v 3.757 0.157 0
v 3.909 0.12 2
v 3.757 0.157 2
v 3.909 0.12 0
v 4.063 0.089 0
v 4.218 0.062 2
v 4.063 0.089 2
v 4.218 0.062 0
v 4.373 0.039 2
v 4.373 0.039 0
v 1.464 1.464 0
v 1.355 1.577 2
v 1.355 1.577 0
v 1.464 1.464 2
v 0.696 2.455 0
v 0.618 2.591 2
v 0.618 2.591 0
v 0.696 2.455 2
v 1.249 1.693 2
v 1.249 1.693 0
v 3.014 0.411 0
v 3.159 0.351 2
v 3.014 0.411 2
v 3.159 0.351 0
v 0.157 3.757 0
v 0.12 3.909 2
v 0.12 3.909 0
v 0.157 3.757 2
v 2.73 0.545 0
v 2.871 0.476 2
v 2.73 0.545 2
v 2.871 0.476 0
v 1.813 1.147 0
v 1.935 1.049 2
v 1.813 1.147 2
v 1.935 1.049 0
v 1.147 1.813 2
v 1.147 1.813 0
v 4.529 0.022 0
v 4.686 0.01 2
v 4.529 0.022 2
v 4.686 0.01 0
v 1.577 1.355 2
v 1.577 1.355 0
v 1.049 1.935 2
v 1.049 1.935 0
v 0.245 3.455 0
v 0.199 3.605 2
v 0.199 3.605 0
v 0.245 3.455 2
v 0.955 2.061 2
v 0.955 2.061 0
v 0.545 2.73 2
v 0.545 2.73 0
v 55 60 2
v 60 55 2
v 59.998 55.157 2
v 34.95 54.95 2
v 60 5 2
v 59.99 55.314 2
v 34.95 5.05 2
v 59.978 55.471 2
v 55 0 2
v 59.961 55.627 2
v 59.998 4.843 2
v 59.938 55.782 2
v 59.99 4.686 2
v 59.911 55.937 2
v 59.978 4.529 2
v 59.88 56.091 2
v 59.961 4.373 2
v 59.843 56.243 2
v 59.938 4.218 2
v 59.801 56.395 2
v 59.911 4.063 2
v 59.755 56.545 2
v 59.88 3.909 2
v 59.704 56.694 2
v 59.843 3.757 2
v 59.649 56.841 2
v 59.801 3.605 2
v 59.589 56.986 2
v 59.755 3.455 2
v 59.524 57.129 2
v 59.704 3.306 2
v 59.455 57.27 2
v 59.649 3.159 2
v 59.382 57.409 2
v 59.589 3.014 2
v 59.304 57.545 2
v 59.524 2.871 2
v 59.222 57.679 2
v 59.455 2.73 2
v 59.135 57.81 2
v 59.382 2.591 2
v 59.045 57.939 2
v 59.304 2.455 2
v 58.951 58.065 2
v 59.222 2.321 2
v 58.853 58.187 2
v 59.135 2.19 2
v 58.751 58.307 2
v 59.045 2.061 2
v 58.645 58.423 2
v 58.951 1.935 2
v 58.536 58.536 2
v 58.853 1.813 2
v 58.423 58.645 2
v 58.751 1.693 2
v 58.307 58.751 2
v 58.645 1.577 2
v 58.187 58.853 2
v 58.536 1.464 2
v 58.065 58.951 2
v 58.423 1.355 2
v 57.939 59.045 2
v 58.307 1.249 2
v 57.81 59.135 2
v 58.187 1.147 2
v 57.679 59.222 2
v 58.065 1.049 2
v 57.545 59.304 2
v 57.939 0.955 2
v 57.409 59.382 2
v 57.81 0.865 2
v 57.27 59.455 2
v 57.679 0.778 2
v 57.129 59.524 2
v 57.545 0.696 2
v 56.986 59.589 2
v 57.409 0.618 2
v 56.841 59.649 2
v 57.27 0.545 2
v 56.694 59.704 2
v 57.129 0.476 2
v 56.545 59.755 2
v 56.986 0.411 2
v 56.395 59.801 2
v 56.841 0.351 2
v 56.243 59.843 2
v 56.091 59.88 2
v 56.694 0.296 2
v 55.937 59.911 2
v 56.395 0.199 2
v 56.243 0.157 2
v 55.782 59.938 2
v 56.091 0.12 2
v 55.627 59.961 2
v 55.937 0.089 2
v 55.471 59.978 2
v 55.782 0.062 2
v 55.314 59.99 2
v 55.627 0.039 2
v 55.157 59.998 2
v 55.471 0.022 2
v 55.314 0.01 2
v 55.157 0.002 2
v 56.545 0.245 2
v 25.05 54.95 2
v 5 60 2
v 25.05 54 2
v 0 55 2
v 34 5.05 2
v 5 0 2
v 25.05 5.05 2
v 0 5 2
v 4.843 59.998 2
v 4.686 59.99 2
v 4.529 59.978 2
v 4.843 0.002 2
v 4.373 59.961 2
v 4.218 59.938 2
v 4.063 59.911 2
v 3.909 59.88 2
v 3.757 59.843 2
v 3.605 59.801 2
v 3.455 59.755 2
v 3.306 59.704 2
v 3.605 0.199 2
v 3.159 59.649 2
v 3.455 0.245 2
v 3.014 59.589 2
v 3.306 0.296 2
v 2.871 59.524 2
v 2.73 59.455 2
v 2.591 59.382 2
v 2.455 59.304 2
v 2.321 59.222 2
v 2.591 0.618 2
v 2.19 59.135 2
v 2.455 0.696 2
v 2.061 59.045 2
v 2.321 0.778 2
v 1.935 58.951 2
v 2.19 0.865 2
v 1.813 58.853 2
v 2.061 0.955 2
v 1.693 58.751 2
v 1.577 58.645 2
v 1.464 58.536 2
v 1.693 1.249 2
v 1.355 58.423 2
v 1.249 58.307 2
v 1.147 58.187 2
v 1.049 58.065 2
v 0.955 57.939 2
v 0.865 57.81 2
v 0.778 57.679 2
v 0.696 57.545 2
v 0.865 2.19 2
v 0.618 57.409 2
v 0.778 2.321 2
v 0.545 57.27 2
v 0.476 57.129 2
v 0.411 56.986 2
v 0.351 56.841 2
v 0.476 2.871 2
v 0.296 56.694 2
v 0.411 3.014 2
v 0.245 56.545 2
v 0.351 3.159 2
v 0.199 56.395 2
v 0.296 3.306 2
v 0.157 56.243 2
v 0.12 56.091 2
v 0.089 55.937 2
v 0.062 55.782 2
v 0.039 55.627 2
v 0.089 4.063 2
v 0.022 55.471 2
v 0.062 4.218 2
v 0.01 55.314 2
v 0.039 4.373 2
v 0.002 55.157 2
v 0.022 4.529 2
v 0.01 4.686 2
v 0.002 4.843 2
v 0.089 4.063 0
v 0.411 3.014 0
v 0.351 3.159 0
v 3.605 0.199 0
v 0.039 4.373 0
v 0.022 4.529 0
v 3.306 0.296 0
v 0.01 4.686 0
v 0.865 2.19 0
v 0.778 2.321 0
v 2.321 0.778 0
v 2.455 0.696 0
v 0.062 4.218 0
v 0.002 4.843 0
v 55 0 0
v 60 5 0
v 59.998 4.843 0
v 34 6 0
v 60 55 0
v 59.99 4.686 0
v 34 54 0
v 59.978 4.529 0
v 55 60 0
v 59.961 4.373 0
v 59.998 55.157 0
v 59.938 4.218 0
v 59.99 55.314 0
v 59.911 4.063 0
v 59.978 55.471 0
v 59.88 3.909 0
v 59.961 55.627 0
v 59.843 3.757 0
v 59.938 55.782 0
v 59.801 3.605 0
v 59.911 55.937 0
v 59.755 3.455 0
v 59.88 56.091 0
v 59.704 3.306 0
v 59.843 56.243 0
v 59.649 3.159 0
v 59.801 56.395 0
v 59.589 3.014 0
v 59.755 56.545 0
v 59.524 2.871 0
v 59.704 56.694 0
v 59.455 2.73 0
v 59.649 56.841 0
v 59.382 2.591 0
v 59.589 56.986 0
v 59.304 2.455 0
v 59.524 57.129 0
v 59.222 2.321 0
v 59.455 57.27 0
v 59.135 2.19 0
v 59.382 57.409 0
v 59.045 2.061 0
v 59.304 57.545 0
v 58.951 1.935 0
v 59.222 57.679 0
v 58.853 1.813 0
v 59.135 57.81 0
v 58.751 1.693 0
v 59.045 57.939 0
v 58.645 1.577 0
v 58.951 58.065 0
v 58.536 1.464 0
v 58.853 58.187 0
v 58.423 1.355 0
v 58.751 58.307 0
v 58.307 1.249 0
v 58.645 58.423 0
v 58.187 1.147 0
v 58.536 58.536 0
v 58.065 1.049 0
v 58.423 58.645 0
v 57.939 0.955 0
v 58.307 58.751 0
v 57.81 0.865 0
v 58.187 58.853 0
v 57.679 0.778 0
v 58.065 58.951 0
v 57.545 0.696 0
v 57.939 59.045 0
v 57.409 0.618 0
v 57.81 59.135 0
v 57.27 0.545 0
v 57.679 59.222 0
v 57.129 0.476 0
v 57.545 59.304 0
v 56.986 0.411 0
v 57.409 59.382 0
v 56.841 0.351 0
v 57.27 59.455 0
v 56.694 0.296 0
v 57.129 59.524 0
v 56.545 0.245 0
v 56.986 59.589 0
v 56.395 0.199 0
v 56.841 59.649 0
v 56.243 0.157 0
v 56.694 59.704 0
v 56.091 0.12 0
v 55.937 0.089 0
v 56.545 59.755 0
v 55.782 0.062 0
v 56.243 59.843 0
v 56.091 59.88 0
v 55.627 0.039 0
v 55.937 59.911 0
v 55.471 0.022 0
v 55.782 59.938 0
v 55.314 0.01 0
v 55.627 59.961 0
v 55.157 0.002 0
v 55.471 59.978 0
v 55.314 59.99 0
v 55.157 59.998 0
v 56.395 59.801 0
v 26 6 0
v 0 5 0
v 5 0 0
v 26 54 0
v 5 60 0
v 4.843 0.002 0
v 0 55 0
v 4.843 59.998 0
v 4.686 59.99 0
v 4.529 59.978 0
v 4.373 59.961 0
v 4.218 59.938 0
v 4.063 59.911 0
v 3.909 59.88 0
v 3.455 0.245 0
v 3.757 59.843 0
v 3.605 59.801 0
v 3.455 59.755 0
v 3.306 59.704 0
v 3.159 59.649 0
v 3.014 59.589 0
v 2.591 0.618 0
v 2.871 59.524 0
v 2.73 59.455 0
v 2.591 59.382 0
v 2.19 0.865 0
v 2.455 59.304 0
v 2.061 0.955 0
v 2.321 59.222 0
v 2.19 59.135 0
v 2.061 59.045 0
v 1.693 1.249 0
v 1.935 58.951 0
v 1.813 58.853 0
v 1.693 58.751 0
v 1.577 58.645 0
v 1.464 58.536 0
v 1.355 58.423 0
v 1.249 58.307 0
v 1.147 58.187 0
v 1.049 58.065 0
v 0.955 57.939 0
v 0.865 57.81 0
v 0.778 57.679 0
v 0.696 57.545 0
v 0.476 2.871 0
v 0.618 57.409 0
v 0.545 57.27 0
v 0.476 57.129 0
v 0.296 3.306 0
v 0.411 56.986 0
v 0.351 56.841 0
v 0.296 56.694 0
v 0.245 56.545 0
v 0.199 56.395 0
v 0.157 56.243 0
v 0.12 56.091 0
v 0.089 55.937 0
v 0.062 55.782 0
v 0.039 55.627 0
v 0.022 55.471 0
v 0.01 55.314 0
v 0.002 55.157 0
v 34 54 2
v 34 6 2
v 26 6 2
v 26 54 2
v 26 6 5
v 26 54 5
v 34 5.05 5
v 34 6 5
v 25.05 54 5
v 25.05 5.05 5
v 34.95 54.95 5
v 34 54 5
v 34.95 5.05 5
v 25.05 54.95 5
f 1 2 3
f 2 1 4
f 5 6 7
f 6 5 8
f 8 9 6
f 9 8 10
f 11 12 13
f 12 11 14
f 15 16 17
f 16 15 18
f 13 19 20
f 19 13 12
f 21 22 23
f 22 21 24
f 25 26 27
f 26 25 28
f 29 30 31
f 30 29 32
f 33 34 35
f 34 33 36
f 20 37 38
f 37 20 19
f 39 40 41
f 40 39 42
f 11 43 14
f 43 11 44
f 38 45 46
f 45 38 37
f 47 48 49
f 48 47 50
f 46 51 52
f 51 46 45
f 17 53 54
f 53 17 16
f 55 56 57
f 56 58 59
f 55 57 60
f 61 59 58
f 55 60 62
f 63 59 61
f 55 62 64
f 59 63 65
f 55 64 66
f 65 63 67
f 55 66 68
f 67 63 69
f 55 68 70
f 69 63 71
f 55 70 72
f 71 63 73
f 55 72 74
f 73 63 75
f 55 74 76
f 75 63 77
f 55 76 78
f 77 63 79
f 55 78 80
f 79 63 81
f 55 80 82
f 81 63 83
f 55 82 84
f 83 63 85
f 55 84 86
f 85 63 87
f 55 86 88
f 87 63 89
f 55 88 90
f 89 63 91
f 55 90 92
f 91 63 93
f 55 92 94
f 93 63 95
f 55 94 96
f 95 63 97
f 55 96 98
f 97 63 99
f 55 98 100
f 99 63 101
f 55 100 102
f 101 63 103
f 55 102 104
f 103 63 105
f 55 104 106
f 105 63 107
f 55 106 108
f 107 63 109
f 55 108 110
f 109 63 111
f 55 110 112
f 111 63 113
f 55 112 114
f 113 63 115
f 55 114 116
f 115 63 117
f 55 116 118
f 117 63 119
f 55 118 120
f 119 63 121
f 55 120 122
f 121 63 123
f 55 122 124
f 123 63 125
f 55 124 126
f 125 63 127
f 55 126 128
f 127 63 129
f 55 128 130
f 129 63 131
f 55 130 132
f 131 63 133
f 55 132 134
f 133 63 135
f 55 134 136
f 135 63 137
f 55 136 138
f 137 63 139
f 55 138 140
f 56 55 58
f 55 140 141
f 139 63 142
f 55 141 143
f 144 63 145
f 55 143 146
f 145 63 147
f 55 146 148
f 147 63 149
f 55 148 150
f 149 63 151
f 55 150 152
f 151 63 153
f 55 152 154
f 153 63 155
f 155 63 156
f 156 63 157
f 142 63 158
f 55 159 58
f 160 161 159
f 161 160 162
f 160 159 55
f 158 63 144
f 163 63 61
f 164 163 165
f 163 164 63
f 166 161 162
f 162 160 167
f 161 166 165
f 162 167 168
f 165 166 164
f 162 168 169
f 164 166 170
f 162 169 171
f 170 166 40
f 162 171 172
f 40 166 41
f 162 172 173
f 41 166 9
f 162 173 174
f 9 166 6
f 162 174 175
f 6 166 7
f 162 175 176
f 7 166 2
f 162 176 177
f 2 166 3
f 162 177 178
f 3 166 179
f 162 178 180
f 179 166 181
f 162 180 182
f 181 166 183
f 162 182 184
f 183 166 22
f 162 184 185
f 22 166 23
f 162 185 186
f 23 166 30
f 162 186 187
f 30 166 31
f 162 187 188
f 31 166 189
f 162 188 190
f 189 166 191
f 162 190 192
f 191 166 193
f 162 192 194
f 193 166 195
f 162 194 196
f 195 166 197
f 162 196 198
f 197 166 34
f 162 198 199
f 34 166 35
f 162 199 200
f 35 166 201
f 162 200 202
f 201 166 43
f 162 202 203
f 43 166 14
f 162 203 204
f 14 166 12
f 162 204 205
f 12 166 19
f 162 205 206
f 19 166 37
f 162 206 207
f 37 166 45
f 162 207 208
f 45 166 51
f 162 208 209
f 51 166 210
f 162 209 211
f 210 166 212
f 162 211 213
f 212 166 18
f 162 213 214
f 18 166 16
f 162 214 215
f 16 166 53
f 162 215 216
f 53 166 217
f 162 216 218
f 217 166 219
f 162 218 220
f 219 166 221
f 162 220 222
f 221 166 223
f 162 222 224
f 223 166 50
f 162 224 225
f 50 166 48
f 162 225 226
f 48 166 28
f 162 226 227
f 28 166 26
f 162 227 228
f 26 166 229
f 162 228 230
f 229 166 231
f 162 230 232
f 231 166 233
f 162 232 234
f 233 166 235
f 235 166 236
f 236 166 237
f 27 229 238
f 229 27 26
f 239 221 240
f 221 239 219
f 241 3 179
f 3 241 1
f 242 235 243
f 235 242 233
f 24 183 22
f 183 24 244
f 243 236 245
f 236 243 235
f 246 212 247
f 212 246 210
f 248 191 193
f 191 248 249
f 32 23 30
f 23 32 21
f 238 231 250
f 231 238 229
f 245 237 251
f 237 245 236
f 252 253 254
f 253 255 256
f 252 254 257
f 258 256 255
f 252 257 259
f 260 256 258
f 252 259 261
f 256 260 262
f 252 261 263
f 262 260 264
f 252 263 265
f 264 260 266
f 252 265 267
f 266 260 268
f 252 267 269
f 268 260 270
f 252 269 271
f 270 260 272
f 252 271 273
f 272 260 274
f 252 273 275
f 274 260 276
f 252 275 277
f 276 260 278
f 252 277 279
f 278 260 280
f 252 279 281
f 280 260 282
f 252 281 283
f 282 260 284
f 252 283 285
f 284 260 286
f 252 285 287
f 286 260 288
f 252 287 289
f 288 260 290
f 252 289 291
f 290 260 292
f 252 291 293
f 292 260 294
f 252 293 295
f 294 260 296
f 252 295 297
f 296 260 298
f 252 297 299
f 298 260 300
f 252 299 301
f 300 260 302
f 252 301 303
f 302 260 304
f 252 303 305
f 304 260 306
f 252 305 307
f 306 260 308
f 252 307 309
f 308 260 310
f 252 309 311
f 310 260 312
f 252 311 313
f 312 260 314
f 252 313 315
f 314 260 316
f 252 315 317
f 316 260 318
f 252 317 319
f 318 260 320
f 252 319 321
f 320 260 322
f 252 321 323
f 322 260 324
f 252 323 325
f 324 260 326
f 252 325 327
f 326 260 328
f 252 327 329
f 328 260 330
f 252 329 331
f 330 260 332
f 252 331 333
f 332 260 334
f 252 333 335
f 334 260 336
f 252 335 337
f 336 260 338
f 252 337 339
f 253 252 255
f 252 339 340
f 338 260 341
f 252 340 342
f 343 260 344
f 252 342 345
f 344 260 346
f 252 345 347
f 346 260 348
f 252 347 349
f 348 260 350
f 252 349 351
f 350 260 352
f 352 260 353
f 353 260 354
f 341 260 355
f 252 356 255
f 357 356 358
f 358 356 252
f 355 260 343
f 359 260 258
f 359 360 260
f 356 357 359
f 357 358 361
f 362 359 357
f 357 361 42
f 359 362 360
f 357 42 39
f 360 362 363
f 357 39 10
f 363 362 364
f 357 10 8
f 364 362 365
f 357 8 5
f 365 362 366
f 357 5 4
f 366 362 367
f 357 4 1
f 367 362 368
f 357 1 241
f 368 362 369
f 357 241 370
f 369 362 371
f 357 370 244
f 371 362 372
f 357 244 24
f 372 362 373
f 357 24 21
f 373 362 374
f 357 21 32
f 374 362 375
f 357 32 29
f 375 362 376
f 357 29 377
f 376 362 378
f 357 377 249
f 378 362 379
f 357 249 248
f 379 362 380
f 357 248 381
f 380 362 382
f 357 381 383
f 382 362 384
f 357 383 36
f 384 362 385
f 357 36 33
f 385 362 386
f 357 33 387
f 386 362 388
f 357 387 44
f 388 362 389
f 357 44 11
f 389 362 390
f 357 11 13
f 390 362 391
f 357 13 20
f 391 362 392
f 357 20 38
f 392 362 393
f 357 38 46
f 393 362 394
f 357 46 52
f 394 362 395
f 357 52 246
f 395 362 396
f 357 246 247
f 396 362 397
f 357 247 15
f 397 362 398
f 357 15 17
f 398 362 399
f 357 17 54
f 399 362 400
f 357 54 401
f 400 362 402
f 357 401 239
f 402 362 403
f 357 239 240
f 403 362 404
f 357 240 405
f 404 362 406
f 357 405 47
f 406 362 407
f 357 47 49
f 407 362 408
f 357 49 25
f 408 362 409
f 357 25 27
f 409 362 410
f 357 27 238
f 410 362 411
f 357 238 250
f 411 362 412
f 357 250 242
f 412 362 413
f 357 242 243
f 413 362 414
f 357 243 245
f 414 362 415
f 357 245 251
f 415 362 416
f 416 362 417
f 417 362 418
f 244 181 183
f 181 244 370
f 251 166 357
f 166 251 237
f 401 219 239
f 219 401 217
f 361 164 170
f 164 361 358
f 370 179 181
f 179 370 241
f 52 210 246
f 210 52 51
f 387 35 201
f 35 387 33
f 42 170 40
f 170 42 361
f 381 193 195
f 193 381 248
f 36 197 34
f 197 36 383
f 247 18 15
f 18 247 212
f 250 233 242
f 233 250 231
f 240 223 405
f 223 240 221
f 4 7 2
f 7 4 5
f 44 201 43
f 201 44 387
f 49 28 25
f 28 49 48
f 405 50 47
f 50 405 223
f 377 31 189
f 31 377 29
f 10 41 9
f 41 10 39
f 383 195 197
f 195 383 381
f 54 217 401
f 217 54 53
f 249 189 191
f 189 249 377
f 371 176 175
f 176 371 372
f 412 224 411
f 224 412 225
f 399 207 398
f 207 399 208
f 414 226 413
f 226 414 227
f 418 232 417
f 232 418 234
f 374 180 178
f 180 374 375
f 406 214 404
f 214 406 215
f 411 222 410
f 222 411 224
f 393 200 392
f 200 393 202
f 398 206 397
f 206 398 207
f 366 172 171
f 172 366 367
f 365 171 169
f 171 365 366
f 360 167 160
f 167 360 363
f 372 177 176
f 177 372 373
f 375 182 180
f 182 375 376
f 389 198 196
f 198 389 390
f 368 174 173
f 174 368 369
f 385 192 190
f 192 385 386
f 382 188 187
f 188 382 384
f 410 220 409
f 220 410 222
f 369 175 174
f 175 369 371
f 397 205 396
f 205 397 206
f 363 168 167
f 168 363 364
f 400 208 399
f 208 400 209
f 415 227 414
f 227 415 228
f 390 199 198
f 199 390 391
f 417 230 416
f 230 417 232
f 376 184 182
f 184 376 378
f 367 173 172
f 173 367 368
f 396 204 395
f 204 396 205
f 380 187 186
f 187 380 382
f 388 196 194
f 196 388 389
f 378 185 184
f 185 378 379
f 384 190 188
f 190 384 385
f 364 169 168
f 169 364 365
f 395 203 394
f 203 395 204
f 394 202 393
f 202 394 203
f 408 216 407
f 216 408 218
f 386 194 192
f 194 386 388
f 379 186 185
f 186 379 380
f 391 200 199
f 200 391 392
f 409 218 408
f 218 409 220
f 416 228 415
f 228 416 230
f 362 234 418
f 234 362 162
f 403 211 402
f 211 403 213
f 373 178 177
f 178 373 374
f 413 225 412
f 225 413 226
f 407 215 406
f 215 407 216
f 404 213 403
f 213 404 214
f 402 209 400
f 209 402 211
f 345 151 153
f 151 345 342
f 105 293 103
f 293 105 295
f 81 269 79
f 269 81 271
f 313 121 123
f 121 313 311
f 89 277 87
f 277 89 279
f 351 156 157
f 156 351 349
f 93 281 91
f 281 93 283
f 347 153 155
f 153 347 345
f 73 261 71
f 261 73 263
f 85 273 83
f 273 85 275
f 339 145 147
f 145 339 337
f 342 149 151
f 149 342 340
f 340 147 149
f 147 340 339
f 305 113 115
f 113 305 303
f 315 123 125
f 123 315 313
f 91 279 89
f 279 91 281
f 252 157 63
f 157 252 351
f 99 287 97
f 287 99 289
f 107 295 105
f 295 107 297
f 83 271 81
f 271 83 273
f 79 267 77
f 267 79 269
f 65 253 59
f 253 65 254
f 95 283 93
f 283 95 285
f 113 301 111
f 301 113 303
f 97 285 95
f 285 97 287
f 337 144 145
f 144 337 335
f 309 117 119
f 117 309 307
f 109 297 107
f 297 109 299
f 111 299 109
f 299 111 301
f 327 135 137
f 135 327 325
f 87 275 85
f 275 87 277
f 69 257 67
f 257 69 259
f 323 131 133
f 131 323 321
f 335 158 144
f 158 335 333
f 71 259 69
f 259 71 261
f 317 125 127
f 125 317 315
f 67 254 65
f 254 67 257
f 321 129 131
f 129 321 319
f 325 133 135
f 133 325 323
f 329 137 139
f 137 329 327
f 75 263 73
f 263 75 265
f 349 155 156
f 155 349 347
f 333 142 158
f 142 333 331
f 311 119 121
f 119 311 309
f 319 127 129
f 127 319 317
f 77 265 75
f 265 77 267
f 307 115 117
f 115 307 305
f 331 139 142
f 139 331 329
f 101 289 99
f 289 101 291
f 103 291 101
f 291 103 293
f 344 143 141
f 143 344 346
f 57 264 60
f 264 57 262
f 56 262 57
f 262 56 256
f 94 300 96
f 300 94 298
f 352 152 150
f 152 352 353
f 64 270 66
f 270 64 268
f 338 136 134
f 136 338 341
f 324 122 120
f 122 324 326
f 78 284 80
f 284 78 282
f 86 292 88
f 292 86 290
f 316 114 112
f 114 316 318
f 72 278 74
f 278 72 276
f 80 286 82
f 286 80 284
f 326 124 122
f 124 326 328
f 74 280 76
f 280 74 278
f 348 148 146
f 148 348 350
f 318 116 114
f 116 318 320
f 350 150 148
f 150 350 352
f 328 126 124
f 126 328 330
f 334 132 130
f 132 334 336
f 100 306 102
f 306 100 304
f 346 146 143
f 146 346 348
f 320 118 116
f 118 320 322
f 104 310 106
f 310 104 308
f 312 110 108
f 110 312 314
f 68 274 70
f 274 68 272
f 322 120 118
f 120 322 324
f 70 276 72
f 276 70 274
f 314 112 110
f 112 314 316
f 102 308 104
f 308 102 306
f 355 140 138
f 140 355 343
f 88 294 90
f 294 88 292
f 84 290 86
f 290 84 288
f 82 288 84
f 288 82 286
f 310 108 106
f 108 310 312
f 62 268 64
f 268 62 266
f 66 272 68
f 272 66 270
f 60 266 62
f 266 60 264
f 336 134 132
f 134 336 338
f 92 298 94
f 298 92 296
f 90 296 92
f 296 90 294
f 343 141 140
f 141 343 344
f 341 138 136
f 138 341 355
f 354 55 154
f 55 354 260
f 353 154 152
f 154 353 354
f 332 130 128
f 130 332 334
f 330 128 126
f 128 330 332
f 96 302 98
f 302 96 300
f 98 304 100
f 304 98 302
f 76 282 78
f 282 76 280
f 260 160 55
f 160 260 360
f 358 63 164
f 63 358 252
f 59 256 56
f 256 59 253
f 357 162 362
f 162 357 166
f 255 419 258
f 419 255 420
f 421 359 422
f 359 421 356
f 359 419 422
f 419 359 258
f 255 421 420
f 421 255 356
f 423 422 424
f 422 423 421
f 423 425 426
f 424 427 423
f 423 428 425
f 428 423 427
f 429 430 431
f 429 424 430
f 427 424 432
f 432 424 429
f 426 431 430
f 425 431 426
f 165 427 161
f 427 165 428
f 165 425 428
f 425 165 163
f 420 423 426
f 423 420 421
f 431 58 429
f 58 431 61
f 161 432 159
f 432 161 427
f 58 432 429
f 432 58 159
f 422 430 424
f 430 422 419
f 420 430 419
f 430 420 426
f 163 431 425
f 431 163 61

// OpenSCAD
thick = 2;

union(){
    difference(){    
        union(){
            translate([5, 5, 0])
            cylinder (h = thick, r = 5, $fn=200);
            translate([5, 55, 0])
            cylinder (h = thick, r = 5, $fn=200);
            translate([55, 5, 0])
            cylinder (h = thick, r = 5, $fn=200);
            translate([55, 55, 0])
            cylinder (h = thick, r = 5, $fn=200);
            translate([5, 0, 0])
            cube([50, 60, thick]);
            translate([0, 5, 0])
            cube([60, 50, thick]);
        }
        translate([
            (60 - (10 - 2)) / 2, 
            (60 - (50 - 2)) / 2,
            0
        ])
        cube([10 - 2, 50 - 2, thick], false);
    }
    translate([
        (60 - (10 - 2)) / 2 - 0.95, 
        (60 - (50 - 2)) / 2 - 0.95,
        thick
    ])
    union(){
        cube([0.95, 50 - 2 + 2 * 0.95, 3], false);
        cube([10 - 2 + 2 * 0.95, 0.95, 3], false);
    }
    translate([
        (60 - (10 - 2)) / 2 - 0.95, 
        (60 - (50 - 2)) / 2 + 50 - 2,
        thick
    ])
    cube([10 - 2 + 2 * 0.95, 0.95, 3], false);
    translate([
        (60 - (10 - 2)) / 2 + 10 - 2, 
        (60 - (50 - 2)) / 2 - 0.95,
        thick
    ])
    cube([0.95, 50 - 2 + 2 * 0.95, 3], false);
}
